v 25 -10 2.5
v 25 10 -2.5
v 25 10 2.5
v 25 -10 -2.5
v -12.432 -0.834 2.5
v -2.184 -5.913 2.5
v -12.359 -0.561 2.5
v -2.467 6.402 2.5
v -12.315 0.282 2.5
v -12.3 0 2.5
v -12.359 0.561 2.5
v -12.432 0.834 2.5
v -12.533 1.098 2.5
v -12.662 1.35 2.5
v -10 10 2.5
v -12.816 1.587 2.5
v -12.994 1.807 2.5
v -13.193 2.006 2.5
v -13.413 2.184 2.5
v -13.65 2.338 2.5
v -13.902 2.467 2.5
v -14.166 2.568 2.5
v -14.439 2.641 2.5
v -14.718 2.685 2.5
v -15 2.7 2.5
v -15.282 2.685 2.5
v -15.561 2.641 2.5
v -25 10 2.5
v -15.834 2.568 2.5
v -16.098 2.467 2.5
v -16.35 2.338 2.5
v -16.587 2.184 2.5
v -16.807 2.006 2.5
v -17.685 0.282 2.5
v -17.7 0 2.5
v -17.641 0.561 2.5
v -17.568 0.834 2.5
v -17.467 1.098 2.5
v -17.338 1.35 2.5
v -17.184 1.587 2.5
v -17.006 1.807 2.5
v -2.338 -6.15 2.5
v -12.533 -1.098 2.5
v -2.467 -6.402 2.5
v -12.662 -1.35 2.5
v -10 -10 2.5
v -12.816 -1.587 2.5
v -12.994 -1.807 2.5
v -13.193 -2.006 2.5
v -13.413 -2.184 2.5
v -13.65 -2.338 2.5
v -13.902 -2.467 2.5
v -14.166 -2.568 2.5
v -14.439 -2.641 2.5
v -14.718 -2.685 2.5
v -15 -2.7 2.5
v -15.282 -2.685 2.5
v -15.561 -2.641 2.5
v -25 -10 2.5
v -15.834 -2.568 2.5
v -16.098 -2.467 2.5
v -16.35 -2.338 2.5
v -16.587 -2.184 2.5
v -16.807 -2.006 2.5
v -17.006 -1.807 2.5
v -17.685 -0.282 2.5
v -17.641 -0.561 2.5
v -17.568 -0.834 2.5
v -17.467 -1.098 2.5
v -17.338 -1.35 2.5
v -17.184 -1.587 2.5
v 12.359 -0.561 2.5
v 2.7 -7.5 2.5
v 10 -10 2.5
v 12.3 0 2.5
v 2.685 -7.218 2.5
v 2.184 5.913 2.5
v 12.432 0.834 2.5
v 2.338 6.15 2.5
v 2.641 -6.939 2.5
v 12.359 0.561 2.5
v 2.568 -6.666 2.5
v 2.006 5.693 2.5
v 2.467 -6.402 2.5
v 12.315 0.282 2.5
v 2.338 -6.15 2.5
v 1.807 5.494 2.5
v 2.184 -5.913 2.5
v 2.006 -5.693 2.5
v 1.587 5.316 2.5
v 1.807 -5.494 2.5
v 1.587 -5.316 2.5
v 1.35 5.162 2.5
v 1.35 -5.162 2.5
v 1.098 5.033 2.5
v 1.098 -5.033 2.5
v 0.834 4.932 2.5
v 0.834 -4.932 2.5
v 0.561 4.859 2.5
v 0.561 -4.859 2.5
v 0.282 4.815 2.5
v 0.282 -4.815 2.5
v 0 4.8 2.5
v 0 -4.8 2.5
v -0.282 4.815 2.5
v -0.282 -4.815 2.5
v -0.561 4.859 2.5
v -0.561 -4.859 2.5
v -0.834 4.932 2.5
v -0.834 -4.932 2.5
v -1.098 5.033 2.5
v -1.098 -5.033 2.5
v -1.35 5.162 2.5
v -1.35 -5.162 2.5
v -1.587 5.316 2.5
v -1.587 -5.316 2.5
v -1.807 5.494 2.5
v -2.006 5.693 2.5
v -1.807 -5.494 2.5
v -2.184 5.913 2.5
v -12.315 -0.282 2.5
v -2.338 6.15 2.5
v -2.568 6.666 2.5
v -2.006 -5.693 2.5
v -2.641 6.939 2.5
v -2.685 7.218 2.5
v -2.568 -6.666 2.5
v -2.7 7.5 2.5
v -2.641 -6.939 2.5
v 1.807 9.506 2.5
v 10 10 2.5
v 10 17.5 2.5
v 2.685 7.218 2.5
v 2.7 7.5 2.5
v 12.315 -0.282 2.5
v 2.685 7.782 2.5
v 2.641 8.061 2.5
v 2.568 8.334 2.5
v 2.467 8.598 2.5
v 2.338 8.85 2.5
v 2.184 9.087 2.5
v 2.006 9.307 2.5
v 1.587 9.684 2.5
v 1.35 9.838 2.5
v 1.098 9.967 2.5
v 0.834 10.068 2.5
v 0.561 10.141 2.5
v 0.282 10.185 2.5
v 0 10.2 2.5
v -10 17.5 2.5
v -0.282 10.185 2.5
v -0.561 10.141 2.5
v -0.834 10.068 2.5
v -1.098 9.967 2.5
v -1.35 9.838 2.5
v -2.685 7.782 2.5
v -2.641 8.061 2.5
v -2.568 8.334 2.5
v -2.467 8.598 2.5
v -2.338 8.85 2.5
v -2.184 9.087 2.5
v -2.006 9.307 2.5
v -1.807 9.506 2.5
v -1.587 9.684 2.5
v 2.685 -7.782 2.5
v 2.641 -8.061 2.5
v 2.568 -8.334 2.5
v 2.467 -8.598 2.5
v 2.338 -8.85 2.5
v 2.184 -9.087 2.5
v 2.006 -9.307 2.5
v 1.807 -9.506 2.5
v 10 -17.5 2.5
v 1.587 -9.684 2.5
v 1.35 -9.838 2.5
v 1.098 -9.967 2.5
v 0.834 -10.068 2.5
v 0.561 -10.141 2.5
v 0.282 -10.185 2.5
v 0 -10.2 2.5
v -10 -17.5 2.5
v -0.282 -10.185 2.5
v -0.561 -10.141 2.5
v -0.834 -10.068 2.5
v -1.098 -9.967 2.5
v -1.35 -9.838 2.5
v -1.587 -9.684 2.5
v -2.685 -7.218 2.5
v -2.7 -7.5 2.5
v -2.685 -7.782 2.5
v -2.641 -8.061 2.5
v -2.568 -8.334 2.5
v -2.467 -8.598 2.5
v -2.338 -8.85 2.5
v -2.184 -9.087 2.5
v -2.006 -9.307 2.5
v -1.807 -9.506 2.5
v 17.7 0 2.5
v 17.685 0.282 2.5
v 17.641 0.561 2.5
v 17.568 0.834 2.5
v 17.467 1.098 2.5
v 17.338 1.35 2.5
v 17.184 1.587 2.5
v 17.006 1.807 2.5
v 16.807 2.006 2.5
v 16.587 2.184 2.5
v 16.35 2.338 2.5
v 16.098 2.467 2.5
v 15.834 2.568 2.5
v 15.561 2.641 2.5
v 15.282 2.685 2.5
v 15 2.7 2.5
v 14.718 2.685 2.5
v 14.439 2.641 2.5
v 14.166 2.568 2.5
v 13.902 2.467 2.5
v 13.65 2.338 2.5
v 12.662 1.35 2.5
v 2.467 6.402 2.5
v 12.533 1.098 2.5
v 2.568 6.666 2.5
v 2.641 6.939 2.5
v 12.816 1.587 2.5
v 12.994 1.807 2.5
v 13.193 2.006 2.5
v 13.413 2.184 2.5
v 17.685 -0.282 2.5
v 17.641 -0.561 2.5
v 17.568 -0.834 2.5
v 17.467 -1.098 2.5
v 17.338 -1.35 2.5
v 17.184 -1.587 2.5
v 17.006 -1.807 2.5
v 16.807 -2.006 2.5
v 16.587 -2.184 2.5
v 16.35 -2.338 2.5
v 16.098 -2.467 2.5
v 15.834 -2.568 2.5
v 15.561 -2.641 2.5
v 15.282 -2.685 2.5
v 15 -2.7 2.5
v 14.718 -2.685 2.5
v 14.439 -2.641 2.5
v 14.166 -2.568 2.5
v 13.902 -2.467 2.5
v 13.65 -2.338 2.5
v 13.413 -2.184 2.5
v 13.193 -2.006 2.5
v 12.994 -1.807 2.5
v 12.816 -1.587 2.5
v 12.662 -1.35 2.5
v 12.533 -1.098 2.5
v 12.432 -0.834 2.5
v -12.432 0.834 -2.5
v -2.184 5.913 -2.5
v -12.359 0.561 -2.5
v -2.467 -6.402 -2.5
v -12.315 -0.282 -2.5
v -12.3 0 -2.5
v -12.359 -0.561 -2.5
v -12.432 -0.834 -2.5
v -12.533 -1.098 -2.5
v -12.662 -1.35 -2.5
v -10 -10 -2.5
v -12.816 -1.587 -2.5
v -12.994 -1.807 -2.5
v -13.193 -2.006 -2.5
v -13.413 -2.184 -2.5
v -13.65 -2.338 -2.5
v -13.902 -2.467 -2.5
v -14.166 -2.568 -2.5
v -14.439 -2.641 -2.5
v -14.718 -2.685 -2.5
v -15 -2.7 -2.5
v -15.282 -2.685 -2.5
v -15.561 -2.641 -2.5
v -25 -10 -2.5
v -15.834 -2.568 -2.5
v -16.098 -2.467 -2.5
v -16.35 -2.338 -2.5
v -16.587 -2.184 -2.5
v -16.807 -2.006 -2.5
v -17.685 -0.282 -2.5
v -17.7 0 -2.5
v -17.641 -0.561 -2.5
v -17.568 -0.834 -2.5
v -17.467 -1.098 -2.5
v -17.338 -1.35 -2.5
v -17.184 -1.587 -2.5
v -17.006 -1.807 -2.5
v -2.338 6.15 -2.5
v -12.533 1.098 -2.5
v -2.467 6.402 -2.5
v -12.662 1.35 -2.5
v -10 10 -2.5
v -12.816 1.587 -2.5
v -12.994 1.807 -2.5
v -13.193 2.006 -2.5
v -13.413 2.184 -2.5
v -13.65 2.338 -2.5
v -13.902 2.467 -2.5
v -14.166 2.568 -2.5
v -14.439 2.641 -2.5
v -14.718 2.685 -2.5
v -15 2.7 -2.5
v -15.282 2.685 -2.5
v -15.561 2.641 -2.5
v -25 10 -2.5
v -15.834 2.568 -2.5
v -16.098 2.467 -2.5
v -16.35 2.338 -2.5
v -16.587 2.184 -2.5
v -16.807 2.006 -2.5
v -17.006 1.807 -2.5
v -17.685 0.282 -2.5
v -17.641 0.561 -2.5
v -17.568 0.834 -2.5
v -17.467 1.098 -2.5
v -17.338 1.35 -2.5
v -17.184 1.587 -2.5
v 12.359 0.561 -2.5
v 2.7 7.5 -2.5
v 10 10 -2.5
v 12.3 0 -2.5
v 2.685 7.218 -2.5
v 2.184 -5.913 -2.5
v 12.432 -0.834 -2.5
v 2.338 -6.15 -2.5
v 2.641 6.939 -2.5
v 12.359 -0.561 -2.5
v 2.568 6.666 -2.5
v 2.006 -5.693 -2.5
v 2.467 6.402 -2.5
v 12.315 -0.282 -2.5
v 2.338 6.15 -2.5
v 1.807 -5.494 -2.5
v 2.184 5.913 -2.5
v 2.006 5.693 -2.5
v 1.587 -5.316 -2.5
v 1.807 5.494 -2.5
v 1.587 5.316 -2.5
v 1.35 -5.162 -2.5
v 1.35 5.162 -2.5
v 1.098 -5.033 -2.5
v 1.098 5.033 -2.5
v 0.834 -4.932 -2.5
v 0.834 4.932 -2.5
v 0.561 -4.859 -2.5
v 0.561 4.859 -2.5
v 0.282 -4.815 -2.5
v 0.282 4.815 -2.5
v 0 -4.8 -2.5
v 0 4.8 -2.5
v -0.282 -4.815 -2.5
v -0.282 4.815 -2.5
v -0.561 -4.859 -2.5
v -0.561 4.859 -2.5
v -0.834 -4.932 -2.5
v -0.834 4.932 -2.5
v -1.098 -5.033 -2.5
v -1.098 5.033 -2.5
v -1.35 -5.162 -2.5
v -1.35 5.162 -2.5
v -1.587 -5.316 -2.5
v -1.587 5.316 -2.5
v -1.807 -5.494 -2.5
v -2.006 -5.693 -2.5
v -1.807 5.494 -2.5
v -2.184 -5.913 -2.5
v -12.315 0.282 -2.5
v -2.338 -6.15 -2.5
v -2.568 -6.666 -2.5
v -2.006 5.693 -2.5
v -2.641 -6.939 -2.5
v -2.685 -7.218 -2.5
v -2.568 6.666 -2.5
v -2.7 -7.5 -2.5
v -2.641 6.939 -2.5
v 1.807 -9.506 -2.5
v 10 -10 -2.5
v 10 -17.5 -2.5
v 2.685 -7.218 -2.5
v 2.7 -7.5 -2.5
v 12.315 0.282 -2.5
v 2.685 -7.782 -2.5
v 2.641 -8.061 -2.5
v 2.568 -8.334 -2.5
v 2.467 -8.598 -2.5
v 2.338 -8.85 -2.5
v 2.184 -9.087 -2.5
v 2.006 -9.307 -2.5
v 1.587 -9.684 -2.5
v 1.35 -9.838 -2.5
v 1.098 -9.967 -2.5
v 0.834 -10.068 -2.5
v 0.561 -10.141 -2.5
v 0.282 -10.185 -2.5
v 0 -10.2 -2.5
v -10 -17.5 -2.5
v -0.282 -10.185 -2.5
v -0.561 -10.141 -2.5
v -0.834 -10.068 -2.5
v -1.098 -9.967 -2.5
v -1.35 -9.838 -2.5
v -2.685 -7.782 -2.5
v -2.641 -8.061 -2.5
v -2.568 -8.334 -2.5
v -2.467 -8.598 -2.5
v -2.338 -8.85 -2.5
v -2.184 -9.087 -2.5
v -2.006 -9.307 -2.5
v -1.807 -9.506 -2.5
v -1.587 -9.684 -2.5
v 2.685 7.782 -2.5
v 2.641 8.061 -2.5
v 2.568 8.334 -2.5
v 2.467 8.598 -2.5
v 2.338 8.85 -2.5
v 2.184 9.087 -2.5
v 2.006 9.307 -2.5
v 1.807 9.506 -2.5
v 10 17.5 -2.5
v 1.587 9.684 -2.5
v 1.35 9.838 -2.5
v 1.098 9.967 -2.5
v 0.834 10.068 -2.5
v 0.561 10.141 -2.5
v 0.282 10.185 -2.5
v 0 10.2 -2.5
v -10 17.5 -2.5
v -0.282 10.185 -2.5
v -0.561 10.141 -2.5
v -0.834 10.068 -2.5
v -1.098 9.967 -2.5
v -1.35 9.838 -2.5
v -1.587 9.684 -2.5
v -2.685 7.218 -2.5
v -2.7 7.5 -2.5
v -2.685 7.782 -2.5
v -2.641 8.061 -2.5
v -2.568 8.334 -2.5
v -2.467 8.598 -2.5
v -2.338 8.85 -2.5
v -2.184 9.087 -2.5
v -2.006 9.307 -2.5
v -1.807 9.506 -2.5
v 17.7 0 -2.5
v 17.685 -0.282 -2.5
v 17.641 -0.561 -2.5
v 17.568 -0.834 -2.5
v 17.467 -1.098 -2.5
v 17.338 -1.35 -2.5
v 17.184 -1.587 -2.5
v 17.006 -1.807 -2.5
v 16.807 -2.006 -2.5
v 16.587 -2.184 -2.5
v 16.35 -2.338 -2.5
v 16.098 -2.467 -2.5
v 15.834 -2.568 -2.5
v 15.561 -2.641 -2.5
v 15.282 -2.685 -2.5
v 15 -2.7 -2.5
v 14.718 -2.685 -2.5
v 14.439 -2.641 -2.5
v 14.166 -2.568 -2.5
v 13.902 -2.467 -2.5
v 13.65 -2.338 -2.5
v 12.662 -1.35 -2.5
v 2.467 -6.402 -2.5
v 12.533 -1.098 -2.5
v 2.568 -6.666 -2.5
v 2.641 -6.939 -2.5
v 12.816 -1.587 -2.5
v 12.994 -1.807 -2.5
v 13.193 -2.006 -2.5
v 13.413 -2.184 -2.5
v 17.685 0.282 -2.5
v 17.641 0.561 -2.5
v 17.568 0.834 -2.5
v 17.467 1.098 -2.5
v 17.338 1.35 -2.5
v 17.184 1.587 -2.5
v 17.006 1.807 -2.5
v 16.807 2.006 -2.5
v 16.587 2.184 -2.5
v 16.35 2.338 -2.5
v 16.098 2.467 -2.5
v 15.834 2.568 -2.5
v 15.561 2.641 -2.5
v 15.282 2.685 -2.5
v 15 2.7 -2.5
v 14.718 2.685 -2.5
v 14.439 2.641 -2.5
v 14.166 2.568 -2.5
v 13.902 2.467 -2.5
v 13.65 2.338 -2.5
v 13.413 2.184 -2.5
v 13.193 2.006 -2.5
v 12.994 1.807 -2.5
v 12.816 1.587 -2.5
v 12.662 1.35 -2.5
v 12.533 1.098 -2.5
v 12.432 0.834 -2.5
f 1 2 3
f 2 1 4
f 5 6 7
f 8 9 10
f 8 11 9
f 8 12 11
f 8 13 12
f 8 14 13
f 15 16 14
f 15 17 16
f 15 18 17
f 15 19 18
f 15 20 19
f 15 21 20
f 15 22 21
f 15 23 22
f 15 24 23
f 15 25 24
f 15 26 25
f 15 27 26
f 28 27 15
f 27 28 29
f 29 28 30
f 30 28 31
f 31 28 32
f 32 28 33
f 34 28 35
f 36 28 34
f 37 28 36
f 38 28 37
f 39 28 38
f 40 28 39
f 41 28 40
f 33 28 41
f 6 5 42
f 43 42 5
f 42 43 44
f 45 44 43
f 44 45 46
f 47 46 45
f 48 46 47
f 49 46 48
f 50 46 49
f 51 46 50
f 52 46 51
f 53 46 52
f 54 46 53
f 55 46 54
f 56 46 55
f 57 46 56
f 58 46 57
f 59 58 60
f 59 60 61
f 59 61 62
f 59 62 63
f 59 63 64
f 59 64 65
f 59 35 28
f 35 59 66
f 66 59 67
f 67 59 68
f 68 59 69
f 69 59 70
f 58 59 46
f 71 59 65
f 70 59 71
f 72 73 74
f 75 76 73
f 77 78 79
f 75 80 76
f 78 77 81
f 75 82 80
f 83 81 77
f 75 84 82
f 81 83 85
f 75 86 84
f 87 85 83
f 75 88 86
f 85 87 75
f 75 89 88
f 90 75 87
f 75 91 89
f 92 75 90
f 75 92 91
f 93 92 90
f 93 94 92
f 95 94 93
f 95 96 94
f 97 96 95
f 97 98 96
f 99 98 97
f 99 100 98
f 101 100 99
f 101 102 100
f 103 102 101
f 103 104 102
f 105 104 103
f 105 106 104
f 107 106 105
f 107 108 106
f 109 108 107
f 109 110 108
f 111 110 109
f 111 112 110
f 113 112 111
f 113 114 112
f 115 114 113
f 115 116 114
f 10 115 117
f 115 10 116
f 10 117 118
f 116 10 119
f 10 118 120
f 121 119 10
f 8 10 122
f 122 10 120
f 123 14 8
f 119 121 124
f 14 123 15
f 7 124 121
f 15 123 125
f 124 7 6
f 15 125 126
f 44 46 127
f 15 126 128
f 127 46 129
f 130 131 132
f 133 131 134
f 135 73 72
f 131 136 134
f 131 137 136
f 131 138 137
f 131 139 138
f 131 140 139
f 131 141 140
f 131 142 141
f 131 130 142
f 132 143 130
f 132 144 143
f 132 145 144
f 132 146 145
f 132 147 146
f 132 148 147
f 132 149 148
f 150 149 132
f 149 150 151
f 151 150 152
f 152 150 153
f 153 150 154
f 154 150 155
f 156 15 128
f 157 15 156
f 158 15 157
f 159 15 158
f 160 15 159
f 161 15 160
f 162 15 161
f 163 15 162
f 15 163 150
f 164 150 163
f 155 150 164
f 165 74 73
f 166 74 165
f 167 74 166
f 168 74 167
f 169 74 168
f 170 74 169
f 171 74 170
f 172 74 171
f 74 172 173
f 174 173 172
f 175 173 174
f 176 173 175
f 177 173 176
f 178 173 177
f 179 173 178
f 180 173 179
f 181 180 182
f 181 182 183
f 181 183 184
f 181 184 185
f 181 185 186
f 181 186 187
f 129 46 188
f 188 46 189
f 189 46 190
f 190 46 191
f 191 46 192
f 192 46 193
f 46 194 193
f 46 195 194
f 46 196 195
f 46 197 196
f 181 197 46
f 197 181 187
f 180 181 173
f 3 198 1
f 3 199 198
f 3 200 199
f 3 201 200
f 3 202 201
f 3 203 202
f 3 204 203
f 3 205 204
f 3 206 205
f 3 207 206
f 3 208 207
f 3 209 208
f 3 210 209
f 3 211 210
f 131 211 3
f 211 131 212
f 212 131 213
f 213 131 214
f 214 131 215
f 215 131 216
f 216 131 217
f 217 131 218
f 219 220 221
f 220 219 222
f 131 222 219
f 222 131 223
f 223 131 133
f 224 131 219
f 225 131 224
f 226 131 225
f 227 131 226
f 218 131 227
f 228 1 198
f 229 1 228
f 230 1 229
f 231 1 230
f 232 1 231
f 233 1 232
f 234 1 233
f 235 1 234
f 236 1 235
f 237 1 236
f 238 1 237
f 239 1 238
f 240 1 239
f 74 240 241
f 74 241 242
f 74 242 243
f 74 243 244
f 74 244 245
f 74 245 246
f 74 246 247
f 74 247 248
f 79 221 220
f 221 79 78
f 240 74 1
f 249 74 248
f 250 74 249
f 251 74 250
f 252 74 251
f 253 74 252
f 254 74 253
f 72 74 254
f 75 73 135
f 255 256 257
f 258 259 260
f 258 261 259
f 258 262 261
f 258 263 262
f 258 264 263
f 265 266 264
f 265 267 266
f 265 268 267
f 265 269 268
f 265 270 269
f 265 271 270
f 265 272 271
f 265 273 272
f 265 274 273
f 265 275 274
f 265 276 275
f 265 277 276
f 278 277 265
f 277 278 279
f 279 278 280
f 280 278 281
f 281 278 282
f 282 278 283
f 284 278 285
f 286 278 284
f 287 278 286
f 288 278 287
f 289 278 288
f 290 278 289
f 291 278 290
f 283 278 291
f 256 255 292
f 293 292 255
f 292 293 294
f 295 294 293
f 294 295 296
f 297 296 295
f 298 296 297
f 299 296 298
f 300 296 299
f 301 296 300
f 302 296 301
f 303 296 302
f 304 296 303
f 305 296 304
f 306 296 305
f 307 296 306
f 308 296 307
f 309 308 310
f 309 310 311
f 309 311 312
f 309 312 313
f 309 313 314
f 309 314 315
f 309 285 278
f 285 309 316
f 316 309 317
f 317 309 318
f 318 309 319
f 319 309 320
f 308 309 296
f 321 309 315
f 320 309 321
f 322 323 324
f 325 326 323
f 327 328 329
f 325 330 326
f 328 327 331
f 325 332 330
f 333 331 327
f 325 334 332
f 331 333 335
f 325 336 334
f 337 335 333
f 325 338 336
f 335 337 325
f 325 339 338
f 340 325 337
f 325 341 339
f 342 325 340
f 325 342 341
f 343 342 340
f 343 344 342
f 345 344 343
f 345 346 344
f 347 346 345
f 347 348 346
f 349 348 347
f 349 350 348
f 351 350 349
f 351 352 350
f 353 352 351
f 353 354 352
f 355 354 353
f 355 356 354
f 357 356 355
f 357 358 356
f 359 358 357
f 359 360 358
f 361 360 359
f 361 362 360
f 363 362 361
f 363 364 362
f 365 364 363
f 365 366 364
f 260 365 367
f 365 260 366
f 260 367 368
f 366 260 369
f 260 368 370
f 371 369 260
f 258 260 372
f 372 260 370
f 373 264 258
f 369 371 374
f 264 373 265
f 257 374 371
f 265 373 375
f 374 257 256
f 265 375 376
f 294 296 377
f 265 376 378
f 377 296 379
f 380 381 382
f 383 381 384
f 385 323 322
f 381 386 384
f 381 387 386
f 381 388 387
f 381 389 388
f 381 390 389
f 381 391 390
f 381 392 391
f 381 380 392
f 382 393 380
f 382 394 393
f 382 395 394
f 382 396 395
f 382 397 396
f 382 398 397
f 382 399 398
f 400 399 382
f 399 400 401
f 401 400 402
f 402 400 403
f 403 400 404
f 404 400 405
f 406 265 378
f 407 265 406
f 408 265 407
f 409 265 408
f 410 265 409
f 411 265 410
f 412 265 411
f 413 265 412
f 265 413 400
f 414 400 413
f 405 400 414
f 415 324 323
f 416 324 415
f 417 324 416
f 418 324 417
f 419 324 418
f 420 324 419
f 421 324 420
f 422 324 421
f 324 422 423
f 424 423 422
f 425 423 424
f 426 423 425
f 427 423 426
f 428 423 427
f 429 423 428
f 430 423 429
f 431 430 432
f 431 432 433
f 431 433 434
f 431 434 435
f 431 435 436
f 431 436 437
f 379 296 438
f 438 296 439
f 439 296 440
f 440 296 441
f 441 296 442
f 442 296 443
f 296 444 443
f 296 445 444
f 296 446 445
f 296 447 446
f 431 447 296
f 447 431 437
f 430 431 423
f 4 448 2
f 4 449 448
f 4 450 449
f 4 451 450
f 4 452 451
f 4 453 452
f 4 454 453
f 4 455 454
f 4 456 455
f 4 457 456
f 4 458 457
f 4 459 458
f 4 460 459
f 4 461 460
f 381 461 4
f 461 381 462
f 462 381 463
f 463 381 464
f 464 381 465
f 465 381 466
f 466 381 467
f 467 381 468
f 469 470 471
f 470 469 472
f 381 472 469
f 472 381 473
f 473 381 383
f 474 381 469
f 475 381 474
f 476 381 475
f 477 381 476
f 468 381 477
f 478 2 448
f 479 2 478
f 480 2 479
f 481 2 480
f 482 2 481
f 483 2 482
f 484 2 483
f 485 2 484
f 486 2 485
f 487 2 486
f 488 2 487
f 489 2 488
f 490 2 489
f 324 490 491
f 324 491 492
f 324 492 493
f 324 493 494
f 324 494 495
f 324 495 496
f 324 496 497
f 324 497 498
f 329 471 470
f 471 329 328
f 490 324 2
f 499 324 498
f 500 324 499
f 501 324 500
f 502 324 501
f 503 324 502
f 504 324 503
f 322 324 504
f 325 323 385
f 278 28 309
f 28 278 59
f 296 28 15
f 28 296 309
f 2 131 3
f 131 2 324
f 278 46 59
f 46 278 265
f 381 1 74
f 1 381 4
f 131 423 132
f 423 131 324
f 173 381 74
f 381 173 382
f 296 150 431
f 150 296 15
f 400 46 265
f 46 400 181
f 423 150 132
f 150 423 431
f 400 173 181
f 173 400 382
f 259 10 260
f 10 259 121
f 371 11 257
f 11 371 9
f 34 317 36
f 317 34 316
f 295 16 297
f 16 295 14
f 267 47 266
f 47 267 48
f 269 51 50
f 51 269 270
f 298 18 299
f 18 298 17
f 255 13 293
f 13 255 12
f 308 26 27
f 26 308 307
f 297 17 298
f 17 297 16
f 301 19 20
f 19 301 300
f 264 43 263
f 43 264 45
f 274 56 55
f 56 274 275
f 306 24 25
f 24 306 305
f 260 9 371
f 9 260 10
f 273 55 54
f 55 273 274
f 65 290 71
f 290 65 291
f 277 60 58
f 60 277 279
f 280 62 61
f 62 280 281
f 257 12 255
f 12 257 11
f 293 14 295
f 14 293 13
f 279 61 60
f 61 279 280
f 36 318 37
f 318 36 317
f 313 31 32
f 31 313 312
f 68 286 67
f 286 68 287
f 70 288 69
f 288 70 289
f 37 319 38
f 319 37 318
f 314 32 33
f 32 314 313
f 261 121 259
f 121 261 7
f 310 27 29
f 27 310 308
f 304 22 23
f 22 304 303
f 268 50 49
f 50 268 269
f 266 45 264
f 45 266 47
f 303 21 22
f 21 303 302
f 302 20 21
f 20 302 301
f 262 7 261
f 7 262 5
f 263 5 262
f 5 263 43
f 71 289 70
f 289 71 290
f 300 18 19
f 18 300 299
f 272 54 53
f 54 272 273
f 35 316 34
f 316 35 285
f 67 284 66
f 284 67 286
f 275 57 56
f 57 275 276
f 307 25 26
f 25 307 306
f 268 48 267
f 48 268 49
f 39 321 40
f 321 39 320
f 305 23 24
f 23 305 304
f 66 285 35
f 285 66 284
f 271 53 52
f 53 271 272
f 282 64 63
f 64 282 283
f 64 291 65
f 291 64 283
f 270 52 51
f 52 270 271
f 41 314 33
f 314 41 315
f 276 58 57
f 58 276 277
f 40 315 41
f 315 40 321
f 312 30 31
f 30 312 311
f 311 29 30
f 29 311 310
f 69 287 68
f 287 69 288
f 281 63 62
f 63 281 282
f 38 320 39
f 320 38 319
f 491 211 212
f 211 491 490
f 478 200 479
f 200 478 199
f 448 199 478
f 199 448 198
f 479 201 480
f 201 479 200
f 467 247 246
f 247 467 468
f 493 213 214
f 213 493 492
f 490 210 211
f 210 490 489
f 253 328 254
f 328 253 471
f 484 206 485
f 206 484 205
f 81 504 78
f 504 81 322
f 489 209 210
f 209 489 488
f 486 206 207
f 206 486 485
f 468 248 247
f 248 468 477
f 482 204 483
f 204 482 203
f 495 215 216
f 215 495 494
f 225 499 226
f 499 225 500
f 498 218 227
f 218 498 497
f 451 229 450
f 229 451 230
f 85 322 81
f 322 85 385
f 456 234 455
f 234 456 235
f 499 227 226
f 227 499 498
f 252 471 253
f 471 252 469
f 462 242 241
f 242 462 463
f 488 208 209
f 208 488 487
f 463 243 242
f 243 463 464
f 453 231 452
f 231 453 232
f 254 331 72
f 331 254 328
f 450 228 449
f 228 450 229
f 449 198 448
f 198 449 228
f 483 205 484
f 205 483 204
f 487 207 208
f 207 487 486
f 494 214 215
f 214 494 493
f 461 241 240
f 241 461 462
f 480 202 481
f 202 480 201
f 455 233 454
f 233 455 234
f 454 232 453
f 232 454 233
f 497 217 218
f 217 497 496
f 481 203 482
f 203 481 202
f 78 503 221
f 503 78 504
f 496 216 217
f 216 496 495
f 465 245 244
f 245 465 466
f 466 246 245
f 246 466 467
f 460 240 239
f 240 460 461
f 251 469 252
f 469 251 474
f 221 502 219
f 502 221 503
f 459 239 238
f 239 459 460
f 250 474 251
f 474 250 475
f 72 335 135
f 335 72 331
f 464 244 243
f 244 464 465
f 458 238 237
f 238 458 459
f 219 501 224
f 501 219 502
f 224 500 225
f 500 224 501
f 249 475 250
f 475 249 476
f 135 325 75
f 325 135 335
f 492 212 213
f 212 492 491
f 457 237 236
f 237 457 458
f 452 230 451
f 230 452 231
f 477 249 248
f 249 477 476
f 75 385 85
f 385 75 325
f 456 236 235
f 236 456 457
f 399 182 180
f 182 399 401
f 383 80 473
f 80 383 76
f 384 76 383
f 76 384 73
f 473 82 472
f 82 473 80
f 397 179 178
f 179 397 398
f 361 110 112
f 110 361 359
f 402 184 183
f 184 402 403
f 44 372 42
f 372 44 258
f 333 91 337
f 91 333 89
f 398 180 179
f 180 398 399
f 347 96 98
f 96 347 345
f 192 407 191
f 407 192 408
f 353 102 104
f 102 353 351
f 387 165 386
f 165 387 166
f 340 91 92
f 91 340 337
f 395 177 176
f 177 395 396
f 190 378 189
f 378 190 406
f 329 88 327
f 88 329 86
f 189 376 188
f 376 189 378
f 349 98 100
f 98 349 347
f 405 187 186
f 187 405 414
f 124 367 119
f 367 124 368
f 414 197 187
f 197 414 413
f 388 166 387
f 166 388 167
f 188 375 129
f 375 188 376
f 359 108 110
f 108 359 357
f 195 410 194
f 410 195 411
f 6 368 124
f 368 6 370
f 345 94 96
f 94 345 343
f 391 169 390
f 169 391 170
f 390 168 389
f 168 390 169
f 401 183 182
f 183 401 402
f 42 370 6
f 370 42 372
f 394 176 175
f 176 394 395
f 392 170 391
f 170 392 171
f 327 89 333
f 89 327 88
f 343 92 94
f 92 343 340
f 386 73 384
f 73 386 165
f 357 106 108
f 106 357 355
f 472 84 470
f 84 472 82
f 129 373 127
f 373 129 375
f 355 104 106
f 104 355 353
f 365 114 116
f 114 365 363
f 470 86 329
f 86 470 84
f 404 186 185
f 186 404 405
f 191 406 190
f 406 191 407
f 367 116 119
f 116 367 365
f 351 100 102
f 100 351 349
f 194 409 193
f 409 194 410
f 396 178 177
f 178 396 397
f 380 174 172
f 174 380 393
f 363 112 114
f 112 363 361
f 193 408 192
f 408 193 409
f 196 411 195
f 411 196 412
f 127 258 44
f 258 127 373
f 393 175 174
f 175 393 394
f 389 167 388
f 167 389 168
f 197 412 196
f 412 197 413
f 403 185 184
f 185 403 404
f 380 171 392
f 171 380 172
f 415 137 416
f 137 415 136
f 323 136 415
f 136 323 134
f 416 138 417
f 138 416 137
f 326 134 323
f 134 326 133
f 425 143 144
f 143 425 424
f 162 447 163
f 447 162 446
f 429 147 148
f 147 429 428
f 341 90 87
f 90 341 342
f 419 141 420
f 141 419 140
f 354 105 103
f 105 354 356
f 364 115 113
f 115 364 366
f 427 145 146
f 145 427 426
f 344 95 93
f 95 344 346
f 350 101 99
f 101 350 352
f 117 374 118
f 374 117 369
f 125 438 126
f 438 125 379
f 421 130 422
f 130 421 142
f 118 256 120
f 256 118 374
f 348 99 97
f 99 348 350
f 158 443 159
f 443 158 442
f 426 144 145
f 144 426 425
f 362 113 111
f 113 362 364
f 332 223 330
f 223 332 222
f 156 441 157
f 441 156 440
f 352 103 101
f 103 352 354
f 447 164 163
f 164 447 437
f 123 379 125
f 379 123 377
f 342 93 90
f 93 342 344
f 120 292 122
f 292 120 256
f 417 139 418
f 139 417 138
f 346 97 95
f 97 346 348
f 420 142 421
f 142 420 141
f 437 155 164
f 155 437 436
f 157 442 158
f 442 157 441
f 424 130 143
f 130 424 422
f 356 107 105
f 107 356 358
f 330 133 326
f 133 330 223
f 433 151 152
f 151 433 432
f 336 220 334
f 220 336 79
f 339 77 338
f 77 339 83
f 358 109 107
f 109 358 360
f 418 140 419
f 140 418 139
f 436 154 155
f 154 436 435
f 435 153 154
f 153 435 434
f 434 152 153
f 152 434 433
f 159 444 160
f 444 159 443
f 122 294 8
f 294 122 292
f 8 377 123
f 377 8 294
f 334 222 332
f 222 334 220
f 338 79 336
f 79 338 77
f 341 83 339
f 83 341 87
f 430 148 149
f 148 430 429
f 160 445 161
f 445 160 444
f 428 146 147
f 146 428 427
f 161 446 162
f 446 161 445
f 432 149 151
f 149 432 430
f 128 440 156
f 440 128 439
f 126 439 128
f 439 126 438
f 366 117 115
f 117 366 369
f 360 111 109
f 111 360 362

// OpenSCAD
// T-shaped mounting plate.
$fn = 60;
eps = 0.02;
stem_l = 50;
arm_l = 35;
width = 20;
thickness = 5;
difference() {
    union() { cube([stem_l,width,thickness],center=true); cube([width,arm_l,thickness],center=true); }
    for (p=[[-stem_l/2+10,0],[stem_l/2-10,0],[0,-arm_l/2+10],[0,arm_l/2-10]]) translate([p[0],p[1],-thickness/2-eps]) cylinder(d=5.4,h=thickness+2*eps);
}
